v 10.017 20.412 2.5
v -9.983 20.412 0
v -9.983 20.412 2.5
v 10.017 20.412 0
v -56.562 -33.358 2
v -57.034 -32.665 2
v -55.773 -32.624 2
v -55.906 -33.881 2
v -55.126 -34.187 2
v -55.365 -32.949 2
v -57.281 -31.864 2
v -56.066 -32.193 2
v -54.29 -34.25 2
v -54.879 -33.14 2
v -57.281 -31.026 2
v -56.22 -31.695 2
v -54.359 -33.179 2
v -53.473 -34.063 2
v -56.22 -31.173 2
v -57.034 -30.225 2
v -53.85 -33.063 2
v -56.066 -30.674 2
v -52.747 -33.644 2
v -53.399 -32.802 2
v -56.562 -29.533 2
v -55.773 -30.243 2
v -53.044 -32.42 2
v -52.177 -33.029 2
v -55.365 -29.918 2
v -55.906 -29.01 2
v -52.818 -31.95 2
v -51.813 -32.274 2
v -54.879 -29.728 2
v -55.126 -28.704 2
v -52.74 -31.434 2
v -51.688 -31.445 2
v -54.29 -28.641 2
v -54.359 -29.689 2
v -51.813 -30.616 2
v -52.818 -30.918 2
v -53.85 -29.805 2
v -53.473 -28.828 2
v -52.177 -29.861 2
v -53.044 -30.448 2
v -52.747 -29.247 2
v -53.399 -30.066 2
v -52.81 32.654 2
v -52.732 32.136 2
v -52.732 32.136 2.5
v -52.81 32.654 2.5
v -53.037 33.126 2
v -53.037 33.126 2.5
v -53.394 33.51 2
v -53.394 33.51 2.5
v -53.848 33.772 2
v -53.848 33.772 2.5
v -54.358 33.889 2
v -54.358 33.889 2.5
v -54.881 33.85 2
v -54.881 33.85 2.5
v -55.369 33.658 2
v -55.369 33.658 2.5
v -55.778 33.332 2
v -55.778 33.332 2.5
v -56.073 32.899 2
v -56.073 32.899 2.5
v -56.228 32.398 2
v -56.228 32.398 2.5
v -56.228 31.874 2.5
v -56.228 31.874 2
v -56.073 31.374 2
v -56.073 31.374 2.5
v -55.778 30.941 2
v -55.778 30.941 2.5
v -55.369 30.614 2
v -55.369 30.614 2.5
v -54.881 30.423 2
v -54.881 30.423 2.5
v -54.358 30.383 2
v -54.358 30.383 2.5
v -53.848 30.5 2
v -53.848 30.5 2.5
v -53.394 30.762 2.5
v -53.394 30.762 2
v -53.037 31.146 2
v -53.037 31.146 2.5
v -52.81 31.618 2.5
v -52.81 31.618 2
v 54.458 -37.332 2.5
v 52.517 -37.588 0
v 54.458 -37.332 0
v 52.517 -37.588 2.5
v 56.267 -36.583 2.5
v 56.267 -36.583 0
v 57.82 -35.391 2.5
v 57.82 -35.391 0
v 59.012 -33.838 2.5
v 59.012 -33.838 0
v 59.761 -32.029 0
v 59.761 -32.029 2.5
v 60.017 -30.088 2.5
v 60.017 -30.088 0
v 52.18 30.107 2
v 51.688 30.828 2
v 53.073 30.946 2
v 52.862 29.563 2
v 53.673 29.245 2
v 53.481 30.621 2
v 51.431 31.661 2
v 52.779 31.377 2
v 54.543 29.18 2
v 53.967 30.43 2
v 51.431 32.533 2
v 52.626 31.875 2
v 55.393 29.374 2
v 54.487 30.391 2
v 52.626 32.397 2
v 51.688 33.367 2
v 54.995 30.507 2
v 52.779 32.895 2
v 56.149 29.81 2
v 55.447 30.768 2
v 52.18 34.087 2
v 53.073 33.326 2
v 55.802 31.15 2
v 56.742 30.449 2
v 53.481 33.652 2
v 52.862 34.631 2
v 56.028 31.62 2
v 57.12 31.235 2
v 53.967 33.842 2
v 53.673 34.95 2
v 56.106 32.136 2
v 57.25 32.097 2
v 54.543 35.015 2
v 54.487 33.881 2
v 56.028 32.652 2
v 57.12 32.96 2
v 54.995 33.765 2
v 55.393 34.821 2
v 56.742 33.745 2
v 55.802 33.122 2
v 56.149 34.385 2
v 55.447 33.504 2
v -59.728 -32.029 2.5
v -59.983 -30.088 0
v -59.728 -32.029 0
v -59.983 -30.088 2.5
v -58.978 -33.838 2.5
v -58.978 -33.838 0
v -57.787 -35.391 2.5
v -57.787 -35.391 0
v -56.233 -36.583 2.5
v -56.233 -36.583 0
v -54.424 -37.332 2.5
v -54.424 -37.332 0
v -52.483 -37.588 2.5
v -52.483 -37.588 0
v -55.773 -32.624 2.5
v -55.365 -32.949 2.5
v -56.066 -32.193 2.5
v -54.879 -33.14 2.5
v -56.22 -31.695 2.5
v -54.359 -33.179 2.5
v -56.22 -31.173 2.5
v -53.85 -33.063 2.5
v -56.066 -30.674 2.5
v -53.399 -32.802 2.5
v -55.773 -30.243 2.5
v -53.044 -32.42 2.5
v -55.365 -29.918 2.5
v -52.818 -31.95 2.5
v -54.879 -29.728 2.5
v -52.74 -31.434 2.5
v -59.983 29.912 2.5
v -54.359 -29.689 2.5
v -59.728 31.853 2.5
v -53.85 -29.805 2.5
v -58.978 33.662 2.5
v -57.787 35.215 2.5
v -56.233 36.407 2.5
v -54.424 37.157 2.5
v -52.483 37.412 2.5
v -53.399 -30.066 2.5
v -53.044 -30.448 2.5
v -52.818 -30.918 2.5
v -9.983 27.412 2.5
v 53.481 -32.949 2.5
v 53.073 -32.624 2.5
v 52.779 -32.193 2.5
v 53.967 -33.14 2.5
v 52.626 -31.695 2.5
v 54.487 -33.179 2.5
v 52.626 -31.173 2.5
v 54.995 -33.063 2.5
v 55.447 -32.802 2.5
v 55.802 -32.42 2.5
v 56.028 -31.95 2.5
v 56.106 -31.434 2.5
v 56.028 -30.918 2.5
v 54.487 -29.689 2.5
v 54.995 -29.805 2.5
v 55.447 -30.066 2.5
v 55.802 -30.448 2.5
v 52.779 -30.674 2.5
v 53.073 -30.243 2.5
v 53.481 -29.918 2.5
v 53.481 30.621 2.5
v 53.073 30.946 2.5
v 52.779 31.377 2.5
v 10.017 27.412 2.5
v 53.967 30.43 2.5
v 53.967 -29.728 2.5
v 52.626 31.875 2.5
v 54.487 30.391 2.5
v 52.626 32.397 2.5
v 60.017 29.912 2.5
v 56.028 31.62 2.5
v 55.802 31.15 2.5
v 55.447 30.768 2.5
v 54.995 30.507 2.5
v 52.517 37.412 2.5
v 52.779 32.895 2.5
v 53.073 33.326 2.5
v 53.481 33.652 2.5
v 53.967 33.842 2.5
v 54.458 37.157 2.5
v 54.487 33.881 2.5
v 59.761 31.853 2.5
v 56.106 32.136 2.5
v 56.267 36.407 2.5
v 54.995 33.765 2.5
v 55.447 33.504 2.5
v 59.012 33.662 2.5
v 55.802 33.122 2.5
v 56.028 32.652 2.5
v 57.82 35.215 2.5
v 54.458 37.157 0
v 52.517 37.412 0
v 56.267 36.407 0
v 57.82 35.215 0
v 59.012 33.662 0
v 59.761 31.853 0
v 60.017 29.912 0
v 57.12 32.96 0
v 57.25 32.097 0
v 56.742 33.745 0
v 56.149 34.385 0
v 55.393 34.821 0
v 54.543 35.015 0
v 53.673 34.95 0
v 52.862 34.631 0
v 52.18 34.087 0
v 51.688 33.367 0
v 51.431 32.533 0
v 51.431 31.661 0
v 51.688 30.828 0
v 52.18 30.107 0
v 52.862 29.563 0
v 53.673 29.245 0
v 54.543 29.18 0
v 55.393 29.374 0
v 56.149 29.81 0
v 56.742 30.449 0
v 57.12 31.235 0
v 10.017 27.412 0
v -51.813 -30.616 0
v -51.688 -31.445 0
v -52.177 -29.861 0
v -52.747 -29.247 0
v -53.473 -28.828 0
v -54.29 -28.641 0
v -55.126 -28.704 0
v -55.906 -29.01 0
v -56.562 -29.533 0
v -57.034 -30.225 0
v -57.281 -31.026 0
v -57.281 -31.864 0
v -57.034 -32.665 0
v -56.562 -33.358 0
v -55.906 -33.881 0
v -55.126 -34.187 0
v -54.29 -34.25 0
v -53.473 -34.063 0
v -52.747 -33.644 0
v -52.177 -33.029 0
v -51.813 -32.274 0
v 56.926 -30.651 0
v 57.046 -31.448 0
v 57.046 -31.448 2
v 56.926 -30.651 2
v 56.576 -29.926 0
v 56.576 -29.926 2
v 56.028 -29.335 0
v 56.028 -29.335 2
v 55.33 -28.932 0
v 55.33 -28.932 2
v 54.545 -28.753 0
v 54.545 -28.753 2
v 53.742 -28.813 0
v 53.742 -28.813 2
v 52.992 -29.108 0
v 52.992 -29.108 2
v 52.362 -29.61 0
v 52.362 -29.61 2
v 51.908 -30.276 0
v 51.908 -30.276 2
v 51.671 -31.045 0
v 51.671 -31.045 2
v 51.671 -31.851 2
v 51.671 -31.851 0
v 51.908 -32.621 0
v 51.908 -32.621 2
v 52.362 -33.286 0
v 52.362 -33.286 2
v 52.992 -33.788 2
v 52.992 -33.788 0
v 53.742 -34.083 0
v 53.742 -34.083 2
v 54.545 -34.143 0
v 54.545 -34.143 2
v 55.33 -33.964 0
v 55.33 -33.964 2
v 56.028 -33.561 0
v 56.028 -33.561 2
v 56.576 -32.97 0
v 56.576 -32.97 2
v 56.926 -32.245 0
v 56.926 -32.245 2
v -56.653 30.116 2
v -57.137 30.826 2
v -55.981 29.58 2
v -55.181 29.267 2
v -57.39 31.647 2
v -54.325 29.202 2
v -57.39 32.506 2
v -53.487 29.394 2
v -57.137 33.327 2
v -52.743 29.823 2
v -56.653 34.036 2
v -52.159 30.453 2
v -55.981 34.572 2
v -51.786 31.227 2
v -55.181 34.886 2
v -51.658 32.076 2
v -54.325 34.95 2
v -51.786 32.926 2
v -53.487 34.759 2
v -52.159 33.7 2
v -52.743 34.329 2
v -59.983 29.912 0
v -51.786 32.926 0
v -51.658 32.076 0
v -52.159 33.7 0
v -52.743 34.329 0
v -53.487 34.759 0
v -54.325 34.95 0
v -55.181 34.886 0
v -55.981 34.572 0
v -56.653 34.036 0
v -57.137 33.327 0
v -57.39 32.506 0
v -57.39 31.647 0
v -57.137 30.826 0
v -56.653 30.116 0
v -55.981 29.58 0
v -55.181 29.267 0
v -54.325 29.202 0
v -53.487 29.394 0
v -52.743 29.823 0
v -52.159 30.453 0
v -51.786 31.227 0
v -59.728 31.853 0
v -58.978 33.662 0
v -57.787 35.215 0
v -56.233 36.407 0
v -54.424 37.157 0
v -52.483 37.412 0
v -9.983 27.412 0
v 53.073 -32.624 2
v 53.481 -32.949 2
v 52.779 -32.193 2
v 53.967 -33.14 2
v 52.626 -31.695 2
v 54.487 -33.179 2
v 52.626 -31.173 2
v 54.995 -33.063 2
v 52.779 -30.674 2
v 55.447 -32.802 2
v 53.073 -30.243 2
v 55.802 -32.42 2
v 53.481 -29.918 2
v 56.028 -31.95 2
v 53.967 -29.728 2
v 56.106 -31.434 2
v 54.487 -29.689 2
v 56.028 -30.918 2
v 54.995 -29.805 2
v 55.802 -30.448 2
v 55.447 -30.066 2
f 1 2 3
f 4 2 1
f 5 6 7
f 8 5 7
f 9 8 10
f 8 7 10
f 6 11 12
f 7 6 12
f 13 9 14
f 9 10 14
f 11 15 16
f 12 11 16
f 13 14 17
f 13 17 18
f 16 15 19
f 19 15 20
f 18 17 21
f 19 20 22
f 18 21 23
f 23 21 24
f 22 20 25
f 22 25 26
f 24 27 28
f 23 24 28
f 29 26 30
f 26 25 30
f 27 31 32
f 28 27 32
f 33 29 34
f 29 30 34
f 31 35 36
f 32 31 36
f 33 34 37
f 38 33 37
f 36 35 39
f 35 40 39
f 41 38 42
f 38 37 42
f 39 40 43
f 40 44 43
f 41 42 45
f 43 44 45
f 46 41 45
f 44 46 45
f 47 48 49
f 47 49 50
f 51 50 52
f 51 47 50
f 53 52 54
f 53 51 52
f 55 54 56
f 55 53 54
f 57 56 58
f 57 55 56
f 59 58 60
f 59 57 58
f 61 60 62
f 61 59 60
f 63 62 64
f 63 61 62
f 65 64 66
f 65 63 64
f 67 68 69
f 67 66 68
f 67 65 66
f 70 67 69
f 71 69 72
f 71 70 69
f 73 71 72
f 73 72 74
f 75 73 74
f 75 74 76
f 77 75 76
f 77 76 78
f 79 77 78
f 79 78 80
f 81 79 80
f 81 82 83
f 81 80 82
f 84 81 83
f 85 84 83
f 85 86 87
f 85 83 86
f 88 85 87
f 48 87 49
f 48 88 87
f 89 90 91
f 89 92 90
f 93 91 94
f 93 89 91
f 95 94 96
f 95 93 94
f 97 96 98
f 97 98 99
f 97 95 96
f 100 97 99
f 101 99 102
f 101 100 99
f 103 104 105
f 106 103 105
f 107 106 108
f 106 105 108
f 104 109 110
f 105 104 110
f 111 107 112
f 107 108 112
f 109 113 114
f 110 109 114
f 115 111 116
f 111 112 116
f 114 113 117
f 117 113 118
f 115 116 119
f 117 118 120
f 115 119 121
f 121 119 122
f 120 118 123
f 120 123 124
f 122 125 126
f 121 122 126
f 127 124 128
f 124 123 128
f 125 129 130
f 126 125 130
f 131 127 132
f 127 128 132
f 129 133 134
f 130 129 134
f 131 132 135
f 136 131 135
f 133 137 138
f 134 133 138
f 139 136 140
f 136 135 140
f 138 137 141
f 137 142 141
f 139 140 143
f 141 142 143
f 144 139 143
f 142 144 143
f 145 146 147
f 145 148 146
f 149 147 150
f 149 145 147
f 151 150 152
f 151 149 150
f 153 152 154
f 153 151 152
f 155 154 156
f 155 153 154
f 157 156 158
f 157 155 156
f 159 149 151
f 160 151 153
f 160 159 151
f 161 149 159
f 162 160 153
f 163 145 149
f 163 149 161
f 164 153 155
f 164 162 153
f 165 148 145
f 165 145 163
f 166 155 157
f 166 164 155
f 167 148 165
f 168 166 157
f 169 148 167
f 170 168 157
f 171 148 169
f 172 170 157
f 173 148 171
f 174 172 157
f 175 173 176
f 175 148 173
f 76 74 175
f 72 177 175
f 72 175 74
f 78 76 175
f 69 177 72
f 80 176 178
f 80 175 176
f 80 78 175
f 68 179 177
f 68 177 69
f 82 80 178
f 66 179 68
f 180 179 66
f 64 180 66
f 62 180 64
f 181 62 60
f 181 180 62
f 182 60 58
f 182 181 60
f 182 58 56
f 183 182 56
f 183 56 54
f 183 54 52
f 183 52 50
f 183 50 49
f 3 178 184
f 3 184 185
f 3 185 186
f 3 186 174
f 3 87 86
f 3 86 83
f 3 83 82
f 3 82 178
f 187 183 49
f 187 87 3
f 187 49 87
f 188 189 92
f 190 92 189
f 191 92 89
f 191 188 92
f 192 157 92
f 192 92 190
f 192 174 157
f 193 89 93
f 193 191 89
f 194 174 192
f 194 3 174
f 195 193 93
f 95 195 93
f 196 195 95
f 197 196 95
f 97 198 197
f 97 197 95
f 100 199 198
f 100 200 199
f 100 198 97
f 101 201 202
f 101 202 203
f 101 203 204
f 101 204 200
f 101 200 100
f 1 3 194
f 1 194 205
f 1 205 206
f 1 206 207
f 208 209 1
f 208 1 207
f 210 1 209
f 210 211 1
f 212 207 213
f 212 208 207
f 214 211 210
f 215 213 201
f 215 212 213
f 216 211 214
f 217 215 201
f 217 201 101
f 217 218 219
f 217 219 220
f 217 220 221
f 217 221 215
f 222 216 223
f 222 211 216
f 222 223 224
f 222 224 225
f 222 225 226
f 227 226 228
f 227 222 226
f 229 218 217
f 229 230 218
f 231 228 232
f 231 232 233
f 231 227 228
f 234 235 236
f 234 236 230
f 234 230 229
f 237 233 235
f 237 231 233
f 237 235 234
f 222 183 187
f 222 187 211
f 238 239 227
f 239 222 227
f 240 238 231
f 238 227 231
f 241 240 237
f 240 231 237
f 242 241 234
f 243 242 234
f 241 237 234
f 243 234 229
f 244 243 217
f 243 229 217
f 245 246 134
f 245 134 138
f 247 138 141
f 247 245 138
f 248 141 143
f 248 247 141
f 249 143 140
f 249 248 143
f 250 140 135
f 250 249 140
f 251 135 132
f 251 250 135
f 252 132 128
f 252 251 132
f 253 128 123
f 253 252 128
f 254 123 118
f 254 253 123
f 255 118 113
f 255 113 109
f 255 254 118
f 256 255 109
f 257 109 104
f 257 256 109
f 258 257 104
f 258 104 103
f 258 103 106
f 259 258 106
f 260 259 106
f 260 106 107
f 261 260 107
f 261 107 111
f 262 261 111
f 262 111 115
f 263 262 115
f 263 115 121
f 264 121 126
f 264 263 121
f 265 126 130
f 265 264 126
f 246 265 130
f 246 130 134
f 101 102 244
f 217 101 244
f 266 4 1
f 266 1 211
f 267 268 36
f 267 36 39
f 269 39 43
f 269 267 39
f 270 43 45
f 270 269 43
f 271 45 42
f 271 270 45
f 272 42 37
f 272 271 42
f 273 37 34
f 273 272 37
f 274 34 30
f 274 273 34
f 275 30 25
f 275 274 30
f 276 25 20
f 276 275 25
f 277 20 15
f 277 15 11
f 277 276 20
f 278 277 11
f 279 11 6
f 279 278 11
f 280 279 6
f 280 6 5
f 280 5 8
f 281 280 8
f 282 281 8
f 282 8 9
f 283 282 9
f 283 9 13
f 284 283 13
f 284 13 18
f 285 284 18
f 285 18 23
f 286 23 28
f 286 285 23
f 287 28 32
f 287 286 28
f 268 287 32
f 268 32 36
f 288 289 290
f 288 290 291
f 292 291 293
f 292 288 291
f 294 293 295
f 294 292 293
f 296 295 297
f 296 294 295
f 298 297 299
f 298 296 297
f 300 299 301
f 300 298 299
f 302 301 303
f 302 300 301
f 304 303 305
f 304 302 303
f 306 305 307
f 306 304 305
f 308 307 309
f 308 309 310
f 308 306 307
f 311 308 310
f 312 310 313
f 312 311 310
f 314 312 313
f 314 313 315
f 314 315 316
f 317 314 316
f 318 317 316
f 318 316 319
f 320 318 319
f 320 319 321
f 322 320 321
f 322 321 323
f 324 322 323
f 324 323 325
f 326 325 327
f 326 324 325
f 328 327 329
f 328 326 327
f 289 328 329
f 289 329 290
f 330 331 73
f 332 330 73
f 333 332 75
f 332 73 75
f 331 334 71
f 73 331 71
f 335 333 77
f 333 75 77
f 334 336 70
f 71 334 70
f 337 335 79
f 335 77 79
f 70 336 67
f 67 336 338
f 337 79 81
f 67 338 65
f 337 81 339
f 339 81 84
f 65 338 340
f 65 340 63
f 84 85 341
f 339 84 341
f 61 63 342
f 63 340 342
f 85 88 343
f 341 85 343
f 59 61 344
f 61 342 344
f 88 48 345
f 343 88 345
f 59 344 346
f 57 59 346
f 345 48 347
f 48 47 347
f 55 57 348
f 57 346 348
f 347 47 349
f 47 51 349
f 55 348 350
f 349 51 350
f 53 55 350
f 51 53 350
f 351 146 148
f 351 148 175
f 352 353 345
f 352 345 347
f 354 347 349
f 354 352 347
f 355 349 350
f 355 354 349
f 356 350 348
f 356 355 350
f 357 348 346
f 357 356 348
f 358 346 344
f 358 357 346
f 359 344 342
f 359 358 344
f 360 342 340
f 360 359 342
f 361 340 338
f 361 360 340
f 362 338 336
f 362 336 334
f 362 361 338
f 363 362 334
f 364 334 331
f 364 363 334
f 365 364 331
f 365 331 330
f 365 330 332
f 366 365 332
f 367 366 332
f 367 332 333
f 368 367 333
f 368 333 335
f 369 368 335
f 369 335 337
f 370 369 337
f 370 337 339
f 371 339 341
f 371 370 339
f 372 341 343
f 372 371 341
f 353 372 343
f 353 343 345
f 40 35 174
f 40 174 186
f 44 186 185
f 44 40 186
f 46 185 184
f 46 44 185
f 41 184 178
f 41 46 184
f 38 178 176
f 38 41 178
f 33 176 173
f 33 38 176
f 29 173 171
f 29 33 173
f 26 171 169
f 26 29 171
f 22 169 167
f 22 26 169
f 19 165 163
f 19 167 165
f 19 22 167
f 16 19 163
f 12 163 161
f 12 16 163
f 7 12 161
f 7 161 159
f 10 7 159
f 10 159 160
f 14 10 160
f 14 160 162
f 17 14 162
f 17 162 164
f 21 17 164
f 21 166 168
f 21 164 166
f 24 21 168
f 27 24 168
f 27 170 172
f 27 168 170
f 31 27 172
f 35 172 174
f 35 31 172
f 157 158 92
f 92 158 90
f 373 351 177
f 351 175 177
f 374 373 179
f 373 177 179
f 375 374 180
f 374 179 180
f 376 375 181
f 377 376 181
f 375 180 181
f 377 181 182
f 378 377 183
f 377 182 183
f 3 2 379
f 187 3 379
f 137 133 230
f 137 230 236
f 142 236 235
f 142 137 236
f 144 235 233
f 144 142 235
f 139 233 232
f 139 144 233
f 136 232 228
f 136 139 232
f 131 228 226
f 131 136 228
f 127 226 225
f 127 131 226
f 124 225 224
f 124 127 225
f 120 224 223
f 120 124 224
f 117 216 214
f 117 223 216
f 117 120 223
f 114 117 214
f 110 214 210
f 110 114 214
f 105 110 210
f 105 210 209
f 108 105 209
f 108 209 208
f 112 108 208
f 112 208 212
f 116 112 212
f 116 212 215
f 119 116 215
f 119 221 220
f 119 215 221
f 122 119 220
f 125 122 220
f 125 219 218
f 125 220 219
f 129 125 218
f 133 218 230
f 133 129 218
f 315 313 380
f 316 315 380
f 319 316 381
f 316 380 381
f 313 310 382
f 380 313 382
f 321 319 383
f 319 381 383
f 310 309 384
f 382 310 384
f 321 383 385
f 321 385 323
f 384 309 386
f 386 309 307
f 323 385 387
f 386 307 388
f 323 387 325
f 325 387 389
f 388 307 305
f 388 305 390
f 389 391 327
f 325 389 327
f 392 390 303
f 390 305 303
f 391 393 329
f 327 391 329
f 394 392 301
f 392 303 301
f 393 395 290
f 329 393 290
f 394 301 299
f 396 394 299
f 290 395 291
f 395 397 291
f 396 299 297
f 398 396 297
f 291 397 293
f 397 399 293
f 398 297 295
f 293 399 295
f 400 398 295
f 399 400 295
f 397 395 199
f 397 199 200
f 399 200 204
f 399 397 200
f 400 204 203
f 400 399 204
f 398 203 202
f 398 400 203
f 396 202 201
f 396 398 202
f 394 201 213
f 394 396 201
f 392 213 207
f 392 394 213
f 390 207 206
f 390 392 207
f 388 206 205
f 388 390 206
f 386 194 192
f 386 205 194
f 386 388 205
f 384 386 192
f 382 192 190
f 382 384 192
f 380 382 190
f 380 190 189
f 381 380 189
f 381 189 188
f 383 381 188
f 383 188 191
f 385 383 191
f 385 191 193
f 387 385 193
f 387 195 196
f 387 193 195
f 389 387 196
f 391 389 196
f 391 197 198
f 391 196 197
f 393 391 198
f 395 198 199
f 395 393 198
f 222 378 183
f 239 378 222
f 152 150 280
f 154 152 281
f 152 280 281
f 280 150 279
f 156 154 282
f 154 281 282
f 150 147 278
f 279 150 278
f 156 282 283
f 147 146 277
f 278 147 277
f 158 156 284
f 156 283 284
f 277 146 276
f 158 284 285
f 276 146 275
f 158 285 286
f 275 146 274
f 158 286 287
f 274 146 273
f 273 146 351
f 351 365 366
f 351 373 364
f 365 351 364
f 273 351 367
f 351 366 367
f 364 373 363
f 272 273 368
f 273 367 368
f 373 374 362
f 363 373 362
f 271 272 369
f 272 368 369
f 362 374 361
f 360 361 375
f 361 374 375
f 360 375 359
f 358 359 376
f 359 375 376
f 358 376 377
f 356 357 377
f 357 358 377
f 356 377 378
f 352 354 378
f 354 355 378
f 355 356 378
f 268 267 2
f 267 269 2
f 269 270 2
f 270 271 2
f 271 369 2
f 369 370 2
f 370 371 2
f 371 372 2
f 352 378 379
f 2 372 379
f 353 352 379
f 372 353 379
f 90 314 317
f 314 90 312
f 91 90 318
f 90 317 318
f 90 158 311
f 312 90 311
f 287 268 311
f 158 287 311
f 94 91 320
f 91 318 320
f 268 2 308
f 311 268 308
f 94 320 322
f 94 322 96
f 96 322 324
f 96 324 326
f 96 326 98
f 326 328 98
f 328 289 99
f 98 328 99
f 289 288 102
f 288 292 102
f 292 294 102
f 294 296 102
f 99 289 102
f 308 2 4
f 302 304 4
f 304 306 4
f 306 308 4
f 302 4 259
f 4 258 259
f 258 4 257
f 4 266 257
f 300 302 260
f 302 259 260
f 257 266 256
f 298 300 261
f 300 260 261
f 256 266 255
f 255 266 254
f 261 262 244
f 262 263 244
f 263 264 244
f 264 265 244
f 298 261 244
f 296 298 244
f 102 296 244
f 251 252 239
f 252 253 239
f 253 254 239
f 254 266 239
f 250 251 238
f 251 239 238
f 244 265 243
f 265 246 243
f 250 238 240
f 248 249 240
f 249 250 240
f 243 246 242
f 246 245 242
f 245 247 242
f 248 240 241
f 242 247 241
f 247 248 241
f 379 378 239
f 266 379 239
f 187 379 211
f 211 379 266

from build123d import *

# Parameters (mm, degrees)
F0_W      = 120
F0_H      = 75
F1_DEPTH  = 2.5
F2_R      = 7.5
F4_DEPTH  = 2.5
F6_R      = 2.702459
F6_R_2    = 2.81209
F6_R_3    = 2.881868
F6_R_4    = 2.925727
F7_DEPTH  = 2
F5_R      = 1.75775
F5_R_2    = 1.75
F8_DEPTH  = 25
F9_W      = 20
F9_H      = 7
F10_DEPTH = 25


with BuildPart() as f1:
    # F0 (on Top) → F1 (new body)
    with BuildSketch(Plane.XY):
        with Locations((0.016714, -0.087802)):
            Rectangle(F0_W, F0_H)
        Polygon((54.356078, -27.587802), (50.016714, -27.587802), (50.016714, -31.433773), (-49.983286, -31.433773), (-49.983286, -27.587802), (-54.489789, -27.587802), (-54.489789, 27.412198), (-49.983286, 27.412198), (-49.983286, 32.136187), (50.016714, 32.136187), (50.016714, 27.412198), (54.356078, 27.412198), align=None, mode=Mode.SUBTRACT)
    extrude(amount=F1_DEPTH)

    # F2
    f2_edges = [f1.edges().sort_by_distance(p)[0] for p in [
        (-59.983286, 37.412198, 1.25),
        (-59.983286, -37.587802, 1.25),
        (60.016714, -37.587802, 1.25),
        (60.016714, 37.412198, 1.25),
    ]]
    fillet(f2_edges, radius=F2_R)

    # F3 (on Top) → F4 (join)
    with BuildSketch(Plane.XY):
        Polygon((50.016714, -31.433773), (50.016714, -27.587802), (54.356078, -27.587802), (54.356078, 27.412198), (50.016714, 27.412198), (50.016714, 32.136187), (-49.983286, 32.136187), (-49.983286, 27.412198), (-54.489789, 27.412198), (-54.489789, -27.587802), (-49.983286, -27.587802), (-49.983286, -31.433773), align=None)
    extrude(amount=F4_DEPTH)

    # F6 (on face) → F7 (cut)
    with BuildSketch(Plane.XY):
        with Locations((54.343142, -31.448055)):
            Circle(F6_R)
        with Locations((-54.500151, -31.445347)):
            Circle(F6_R_2)
        with Locations((-54.540183, 32.076258)):
            Circle(F6_R_3)
        with Locations((54.324467, 32.097194)):
            Circle(F6_R_4)
    extrude(amount=F7_DEPTH, mode=Mode.SUBTRACT)

    # F5 (on Top) → F8 (cut)
    with BuildSketch(Plane.XY):
        with Locations((-54.489789, 32.136187)):
            Circle(F5_R)
        with Locations((54.356078, 32.136187)):
            Circle(F5_R_2)
        with Locations((54.356078, -31.433773)):
            Circle(F5_R_2)
        with Locations((-54.489789, -31.433773)):
            Circle(F5_R_2)
    extrude(amount=F8_DEPTH, mode=Mode.SUBTRACT)

    # F9 (on face) → F10 (cut)
    with BuildSketch(Plane.XY):
        with Locations((0.016714, 23.912198)):
            Rectangle(F9_W, F9_H)
    extrude(amount=F10_DEPTH, mode=Mode.SUBTRACT)


solid = f1.part
